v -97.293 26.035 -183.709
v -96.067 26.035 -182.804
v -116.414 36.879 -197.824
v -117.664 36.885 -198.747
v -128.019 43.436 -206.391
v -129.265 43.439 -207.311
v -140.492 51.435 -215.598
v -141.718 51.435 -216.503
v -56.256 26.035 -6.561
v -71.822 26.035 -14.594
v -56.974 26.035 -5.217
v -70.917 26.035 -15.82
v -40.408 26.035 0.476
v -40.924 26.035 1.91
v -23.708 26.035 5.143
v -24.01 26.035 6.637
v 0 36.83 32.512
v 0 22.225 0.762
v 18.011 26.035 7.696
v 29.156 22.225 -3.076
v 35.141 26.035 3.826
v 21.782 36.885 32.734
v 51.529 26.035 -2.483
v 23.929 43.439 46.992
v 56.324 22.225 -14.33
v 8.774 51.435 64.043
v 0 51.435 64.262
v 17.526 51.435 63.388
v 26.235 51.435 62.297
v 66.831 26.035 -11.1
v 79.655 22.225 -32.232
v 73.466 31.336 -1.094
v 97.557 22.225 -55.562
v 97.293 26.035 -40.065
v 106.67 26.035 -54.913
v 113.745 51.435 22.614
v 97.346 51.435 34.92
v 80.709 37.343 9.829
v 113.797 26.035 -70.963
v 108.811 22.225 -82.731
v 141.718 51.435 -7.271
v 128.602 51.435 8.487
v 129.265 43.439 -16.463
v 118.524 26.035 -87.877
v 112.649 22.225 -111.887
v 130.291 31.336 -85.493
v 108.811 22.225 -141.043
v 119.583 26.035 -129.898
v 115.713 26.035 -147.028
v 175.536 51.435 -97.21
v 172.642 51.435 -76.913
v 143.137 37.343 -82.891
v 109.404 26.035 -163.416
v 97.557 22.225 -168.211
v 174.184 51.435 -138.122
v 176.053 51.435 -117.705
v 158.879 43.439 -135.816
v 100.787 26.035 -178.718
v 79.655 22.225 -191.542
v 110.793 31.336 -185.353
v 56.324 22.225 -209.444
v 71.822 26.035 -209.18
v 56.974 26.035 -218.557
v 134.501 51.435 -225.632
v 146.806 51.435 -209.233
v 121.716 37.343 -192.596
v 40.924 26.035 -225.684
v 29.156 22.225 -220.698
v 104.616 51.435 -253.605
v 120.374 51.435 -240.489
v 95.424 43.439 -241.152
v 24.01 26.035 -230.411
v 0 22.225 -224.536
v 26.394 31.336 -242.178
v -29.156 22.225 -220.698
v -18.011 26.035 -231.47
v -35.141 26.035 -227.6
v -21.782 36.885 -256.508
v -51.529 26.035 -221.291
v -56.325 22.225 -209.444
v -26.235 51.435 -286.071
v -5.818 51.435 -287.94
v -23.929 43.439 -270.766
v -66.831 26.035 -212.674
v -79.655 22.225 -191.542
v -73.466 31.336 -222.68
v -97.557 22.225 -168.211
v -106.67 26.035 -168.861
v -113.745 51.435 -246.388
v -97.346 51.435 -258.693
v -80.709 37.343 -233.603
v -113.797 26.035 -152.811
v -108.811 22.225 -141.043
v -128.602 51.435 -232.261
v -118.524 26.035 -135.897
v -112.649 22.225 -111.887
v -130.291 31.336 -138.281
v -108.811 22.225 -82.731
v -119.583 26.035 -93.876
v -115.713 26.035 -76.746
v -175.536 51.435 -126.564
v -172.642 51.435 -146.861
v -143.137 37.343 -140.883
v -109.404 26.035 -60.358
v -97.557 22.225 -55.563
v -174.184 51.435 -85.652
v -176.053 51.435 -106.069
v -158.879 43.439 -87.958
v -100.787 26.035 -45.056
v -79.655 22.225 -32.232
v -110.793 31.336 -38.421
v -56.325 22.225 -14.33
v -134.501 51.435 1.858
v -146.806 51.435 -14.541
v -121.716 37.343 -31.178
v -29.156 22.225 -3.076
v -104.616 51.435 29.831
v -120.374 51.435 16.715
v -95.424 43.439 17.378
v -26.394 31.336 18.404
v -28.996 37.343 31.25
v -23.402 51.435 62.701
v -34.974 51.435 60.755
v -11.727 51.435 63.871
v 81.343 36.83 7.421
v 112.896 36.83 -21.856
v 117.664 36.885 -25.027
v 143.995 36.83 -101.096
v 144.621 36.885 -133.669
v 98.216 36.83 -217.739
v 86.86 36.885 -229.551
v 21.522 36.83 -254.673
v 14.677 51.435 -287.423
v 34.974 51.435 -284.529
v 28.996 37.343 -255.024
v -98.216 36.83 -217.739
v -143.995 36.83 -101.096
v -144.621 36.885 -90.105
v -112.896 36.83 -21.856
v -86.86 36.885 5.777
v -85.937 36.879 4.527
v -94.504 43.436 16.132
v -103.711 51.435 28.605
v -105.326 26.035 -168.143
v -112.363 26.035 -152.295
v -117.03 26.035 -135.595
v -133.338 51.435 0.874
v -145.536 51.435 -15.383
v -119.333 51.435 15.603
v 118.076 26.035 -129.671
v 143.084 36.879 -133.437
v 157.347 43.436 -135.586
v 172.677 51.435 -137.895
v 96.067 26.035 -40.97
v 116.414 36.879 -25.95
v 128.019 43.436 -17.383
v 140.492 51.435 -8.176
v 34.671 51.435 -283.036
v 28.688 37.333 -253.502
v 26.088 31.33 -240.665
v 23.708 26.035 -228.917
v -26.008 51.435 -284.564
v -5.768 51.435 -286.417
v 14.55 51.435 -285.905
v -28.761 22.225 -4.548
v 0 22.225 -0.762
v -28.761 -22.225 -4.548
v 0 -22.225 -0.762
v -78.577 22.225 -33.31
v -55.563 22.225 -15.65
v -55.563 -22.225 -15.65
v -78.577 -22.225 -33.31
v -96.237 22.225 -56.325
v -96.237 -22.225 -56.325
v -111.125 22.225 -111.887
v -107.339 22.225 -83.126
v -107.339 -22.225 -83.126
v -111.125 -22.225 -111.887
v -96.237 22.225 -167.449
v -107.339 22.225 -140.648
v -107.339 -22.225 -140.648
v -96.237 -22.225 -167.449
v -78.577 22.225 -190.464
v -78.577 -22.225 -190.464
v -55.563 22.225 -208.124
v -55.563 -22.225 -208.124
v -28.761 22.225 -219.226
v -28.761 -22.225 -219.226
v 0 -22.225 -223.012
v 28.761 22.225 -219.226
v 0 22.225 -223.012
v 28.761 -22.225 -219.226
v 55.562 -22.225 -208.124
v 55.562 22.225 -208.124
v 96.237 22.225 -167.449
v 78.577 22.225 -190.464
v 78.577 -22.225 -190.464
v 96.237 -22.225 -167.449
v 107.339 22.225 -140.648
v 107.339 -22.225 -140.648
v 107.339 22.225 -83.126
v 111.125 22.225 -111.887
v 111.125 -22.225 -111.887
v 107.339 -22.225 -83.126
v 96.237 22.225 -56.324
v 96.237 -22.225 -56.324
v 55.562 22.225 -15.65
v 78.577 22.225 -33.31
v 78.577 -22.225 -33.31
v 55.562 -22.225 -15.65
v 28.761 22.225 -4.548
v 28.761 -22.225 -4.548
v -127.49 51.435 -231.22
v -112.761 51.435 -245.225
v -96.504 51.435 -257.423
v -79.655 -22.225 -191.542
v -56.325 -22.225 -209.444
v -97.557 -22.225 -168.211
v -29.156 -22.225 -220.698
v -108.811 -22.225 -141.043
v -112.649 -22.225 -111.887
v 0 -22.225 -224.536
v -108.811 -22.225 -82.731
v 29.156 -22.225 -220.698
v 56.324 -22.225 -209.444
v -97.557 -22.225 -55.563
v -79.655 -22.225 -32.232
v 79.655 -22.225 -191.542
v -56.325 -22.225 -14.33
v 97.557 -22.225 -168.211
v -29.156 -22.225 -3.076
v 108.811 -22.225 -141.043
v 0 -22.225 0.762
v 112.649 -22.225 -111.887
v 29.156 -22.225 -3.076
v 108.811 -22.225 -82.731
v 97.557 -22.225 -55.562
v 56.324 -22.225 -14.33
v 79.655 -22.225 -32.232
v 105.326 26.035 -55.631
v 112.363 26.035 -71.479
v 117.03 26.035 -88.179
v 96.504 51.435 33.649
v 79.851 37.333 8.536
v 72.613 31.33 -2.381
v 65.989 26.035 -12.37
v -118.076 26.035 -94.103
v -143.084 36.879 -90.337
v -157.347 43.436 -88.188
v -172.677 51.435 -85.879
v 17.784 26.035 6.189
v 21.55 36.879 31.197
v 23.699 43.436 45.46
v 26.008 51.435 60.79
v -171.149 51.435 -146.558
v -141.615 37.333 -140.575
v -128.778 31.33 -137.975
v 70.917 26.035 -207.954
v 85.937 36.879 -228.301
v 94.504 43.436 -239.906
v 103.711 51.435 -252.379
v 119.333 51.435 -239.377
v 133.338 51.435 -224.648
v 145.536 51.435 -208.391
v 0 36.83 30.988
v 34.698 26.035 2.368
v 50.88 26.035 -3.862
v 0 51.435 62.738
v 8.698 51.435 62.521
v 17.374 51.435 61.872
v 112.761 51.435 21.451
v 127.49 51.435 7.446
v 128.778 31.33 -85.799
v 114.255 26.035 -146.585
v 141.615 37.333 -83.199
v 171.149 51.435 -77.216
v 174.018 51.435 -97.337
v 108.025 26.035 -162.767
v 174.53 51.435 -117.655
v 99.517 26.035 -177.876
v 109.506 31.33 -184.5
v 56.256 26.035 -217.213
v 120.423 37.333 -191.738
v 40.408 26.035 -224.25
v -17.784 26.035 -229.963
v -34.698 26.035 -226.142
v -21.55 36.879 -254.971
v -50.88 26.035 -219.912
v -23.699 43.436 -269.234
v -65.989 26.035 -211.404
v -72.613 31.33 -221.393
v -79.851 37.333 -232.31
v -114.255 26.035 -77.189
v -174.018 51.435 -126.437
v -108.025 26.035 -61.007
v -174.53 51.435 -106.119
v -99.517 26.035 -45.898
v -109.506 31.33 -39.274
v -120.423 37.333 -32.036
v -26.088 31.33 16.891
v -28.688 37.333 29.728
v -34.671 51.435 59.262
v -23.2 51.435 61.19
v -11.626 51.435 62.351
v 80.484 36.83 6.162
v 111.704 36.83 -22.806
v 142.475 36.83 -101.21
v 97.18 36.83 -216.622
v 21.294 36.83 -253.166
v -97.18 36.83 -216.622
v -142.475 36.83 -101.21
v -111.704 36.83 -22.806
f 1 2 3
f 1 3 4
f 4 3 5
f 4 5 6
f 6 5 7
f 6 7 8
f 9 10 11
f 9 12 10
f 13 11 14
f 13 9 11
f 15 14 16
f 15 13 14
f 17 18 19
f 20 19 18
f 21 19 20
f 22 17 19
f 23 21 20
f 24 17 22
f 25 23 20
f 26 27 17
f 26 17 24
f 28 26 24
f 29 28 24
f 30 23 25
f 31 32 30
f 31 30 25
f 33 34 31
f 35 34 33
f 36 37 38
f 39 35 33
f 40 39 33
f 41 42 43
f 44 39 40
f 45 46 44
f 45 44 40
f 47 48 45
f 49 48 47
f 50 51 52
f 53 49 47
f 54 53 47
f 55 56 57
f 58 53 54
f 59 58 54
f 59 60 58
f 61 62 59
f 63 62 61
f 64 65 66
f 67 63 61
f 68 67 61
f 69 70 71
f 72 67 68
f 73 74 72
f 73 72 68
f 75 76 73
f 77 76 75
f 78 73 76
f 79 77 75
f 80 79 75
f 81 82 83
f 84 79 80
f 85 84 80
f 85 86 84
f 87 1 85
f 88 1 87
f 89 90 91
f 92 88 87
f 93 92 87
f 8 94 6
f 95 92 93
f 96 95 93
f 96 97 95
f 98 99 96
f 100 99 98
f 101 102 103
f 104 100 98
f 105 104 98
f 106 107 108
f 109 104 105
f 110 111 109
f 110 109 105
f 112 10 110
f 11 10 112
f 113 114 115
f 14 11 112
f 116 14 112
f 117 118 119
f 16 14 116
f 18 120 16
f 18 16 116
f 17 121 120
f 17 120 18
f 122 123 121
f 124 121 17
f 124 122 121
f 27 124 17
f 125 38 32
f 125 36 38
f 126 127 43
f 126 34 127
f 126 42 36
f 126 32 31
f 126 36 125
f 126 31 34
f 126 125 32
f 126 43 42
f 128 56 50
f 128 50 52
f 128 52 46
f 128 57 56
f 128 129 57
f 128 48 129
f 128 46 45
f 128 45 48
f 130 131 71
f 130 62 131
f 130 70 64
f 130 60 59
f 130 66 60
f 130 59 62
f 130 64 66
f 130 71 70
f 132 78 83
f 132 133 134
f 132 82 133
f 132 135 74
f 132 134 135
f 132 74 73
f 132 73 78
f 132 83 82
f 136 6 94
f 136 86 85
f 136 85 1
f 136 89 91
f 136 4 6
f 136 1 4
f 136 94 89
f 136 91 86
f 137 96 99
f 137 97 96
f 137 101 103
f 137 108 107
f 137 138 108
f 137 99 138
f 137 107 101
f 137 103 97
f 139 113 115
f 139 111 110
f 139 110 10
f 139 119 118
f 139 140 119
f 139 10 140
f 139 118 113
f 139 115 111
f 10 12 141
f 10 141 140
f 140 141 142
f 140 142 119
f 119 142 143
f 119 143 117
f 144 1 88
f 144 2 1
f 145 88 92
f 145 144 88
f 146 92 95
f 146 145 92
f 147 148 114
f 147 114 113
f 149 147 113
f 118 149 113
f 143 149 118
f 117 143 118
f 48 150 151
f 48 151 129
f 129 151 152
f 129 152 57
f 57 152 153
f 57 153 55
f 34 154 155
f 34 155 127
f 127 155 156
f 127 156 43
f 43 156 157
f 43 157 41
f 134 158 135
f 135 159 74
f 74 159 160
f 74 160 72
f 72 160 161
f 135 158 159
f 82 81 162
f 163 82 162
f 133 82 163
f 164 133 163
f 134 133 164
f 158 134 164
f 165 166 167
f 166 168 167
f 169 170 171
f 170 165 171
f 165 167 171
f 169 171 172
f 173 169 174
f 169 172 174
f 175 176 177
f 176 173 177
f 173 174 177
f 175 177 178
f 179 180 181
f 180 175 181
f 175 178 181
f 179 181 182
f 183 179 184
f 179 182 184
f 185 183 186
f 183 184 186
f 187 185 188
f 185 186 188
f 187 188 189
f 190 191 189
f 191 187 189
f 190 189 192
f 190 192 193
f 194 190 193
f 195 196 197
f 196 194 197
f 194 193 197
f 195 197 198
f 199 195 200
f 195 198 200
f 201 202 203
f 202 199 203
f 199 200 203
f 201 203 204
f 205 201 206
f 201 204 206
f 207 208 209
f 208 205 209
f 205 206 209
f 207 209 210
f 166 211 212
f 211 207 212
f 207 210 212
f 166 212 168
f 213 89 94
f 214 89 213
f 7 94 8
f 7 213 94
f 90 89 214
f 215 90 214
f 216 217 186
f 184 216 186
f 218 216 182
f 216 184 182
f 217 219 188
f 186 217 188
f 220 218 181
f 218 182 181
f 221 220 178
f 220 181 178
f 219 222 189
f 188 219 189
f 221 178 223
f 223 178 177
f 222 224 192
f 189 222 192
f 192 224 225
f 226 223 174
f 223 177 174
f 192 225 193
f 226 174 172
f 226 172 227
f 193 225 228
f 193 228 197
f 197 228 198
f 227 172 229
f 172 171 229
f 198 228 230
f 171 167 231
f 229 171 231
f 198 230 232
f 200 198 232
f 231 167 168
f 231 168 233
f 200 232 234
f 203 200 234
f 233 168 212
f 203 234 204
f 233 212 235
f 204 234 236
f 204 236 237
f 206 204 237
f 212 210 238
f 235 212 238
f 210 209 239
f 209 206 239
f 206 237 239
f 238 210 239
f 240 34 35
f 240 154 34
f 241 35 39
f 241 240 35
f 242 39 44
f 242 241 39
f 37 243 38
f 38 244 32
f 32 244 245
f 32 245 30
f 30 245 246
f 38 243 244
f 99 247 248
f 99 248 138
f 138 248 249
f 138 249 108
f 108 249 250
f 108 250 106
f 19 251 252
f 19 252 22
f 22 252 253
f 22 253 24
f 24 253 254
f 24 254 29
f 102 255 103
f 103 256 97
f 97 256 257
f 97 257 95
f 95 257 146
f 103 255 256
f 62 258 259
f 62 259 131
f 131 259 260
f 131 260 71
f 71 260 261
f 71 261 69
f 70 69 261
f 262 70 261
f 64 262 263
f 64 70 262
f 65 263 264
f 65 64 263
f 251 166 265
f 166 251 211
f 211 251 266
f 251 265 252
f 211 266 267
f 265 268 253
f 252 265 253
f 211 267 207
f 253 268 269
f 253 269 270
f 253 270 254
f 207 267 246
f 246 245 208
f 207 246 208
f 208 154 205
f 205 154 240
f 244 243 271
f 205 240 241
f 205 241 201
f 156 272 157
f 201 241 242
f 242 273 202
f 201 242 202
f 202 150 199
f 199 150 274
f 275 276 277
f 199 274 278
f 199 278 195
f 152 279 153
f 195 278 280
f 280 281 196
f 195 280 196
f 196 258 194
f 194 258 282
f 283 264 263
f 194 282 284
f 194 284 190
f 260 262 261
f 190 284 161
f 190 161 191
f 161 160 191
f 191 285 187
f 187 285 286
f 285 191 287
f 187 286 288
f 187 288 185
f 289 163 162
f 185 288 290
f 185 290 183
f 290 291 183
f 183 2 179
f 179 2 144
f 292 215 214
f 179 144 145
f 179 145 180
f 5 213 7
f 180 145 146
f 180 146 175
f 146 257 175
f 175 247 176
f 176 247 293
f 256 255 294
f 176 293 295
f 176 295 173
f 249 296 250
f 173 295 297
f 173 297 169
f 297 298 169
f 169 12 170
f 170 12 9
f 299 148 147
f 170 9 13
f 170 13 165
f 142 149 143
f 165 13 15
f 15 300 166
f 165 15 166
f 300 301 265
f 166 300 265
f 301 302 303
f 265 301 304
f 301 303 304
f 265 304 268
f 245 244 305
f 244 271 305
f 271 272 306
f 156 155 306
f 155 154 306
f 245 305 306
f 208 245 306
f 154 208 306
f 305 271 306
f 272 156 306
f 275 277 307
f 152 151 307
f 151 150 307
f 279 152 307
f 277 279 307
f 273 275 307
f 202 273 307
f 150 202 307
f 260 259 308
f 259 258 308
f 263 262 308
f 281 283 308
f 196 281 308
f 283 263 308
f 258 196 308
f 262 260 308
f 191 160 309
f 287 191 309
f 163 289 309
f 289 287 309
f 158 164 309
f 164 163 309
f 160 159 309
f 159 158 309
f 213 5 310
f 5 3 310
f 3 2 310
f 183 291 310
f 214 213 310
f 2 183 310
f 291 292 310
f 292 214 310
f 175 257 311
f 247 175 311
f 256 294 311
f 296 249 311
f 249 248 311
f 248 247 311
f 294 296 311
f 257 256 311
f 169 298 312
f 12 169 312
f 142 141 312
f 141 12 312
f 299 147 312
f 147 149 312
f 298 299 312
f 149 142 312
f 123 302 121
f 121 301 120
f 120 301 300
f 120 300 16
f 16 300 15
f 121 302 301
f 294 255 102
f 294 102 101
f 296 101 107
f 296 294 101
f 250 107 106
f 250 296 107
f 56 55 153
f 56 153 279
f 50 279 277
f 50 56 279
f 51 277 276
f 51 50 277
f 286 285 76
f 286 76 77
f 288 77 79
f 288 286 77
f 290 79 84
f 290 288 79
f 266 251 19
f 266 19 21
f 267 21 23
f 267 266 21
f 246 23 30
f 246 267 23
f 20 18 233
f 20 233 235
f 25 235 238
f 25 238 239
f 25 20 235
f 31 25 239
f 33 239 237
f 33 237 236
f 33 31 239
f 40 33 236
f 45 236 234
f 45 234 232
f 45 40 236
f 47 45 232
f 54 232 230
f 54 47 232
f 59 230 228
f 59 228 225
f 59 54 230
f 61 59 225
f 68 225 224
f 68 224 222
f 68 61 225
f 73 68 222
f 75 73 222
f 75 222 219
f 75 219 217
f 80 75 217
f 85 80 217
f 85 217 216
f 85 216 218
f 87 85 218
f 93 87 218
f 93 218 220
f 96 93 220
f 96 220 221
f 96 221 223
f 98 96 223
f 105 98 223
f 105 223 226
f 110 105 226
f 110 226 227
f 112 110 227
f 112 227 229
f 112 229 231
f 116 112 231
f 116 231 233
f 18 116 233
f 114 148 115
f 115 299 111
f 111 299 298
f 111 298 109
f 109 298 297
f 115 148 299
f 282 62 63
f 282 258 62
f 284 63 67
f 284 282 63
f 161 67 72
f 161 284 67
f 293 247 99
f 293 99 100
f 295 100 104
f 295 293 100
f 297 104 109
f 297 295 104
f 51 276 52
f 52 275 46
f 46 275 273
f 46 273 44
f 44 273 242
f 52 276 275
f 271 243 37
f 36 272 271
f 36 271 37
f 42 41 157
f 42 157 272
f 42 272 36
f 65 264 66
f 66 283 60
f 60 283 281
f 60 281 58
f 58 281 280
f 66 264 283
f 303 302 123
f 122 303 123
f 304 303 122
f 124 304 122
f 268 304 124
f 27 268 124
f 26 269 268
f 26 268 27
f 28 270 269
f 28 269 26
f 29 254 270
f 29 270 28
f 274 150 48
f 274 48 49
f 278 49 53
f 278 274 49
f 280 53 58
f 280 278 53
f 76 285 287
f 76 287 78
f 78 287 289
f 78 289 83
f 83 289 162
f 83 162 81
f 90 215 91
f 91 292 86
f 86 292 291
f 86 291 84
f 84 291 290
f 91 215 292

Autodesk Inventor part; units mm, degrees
ref_plane "YZ Plane" through (0, 0, 0) normal (1, 0, 0) x (0, 1, 0)
ref_plane "XZ Plane" through (0, 0, 0) normal (0, 1, 0) x (-1, 0, 0)
ref_plane "XY Plane" through (0, 0, 0) normal (0, 0, 1) x (1, 0, 0)
sketch "Sketch1" plane through (0, 0, 0) normal (1, 0, 0) x (0, 1, 0)
  line L0 (-22.225, 0.762) -> (22.225, 0.762)
  line L1 (22.225, -0.762) -> (-22.225, -0.762)
  line L2 (-22.225, -0.762) -> (-22.225, 0.762)
  line L3 (-22.225, 0.762) -> (22.225, -0.762) construction
  line L4 (22.225, 0.762) -> (-22.225, -0.762) construction
  line L5 (22.225, 0.762) -> (51.435, 64.262)
  line L6 (51.435, 64.262) -> (51.435, 62.738)
  line L7 (51.435, 62.738) -> (22.225, -0.762)
  line L8 (0, -0.762) -> (0, -111.887)
  line L9 (0, -111.887) -> (16.3991, -111.887)
  point P0 (0, 0)
  dimension "d1" = 44.45
  dimension "d2" = 63.5
  dimension "d5" = 1.524
  dimension "d6" = 111.125
  dimension "d8" = 29.21
  dimension "d9" = 1.524
revolve "Revolution1" add sketch "Sketch1" angle 360 about axis through (0, 0, -111.887) along (0, 1, 0)
sketch "Sketch2" plane through (0, 51.435, -111.887) normal (0, 1, 0) x (1, 0, 0)
  circle A0 centre (0, 0) radius 111.125 projected
  circle A1 centre (0, 0) radius 176.149 projected
  line L0 (26.2346, -174.1844) -> (-24.5654, -174.1844) construction
  arc A2 (26.2346, -174.1844) -> (97.3464, -146.8065) centre (0, 0) ccw
  line L1 (0, 0) -> (26.2346, -174.1844) construction
  line L2 (0, 0) -> (97.3464, -146.8065) construction
  arc A3 (16.5503, -109.8856) -> (61.4117, -92.6141) centre (0, 0) ccw
  line L3 (16.5503, -109.8856) -> (26.2346, -174.1844)
  line L4 (97.3464, -146.8065) -> (61.4117, -92.6141)
  dimension "d19" = 50.8
  dimension "d20" = 76.2
extrude "Extrusion2" cut sketch "Sketch2" against normal blind 25.4 contours A0 L4 A1 L3 picked at (28.0302, -151.7692)
pattern_circular "Circular Pattern2" count 8 over 360 about axis through (0, 36.83, -111.887) along (0, 1, 0) of "Extrusion2"
properties part number "rubber_sleeve" material "Rubber"
